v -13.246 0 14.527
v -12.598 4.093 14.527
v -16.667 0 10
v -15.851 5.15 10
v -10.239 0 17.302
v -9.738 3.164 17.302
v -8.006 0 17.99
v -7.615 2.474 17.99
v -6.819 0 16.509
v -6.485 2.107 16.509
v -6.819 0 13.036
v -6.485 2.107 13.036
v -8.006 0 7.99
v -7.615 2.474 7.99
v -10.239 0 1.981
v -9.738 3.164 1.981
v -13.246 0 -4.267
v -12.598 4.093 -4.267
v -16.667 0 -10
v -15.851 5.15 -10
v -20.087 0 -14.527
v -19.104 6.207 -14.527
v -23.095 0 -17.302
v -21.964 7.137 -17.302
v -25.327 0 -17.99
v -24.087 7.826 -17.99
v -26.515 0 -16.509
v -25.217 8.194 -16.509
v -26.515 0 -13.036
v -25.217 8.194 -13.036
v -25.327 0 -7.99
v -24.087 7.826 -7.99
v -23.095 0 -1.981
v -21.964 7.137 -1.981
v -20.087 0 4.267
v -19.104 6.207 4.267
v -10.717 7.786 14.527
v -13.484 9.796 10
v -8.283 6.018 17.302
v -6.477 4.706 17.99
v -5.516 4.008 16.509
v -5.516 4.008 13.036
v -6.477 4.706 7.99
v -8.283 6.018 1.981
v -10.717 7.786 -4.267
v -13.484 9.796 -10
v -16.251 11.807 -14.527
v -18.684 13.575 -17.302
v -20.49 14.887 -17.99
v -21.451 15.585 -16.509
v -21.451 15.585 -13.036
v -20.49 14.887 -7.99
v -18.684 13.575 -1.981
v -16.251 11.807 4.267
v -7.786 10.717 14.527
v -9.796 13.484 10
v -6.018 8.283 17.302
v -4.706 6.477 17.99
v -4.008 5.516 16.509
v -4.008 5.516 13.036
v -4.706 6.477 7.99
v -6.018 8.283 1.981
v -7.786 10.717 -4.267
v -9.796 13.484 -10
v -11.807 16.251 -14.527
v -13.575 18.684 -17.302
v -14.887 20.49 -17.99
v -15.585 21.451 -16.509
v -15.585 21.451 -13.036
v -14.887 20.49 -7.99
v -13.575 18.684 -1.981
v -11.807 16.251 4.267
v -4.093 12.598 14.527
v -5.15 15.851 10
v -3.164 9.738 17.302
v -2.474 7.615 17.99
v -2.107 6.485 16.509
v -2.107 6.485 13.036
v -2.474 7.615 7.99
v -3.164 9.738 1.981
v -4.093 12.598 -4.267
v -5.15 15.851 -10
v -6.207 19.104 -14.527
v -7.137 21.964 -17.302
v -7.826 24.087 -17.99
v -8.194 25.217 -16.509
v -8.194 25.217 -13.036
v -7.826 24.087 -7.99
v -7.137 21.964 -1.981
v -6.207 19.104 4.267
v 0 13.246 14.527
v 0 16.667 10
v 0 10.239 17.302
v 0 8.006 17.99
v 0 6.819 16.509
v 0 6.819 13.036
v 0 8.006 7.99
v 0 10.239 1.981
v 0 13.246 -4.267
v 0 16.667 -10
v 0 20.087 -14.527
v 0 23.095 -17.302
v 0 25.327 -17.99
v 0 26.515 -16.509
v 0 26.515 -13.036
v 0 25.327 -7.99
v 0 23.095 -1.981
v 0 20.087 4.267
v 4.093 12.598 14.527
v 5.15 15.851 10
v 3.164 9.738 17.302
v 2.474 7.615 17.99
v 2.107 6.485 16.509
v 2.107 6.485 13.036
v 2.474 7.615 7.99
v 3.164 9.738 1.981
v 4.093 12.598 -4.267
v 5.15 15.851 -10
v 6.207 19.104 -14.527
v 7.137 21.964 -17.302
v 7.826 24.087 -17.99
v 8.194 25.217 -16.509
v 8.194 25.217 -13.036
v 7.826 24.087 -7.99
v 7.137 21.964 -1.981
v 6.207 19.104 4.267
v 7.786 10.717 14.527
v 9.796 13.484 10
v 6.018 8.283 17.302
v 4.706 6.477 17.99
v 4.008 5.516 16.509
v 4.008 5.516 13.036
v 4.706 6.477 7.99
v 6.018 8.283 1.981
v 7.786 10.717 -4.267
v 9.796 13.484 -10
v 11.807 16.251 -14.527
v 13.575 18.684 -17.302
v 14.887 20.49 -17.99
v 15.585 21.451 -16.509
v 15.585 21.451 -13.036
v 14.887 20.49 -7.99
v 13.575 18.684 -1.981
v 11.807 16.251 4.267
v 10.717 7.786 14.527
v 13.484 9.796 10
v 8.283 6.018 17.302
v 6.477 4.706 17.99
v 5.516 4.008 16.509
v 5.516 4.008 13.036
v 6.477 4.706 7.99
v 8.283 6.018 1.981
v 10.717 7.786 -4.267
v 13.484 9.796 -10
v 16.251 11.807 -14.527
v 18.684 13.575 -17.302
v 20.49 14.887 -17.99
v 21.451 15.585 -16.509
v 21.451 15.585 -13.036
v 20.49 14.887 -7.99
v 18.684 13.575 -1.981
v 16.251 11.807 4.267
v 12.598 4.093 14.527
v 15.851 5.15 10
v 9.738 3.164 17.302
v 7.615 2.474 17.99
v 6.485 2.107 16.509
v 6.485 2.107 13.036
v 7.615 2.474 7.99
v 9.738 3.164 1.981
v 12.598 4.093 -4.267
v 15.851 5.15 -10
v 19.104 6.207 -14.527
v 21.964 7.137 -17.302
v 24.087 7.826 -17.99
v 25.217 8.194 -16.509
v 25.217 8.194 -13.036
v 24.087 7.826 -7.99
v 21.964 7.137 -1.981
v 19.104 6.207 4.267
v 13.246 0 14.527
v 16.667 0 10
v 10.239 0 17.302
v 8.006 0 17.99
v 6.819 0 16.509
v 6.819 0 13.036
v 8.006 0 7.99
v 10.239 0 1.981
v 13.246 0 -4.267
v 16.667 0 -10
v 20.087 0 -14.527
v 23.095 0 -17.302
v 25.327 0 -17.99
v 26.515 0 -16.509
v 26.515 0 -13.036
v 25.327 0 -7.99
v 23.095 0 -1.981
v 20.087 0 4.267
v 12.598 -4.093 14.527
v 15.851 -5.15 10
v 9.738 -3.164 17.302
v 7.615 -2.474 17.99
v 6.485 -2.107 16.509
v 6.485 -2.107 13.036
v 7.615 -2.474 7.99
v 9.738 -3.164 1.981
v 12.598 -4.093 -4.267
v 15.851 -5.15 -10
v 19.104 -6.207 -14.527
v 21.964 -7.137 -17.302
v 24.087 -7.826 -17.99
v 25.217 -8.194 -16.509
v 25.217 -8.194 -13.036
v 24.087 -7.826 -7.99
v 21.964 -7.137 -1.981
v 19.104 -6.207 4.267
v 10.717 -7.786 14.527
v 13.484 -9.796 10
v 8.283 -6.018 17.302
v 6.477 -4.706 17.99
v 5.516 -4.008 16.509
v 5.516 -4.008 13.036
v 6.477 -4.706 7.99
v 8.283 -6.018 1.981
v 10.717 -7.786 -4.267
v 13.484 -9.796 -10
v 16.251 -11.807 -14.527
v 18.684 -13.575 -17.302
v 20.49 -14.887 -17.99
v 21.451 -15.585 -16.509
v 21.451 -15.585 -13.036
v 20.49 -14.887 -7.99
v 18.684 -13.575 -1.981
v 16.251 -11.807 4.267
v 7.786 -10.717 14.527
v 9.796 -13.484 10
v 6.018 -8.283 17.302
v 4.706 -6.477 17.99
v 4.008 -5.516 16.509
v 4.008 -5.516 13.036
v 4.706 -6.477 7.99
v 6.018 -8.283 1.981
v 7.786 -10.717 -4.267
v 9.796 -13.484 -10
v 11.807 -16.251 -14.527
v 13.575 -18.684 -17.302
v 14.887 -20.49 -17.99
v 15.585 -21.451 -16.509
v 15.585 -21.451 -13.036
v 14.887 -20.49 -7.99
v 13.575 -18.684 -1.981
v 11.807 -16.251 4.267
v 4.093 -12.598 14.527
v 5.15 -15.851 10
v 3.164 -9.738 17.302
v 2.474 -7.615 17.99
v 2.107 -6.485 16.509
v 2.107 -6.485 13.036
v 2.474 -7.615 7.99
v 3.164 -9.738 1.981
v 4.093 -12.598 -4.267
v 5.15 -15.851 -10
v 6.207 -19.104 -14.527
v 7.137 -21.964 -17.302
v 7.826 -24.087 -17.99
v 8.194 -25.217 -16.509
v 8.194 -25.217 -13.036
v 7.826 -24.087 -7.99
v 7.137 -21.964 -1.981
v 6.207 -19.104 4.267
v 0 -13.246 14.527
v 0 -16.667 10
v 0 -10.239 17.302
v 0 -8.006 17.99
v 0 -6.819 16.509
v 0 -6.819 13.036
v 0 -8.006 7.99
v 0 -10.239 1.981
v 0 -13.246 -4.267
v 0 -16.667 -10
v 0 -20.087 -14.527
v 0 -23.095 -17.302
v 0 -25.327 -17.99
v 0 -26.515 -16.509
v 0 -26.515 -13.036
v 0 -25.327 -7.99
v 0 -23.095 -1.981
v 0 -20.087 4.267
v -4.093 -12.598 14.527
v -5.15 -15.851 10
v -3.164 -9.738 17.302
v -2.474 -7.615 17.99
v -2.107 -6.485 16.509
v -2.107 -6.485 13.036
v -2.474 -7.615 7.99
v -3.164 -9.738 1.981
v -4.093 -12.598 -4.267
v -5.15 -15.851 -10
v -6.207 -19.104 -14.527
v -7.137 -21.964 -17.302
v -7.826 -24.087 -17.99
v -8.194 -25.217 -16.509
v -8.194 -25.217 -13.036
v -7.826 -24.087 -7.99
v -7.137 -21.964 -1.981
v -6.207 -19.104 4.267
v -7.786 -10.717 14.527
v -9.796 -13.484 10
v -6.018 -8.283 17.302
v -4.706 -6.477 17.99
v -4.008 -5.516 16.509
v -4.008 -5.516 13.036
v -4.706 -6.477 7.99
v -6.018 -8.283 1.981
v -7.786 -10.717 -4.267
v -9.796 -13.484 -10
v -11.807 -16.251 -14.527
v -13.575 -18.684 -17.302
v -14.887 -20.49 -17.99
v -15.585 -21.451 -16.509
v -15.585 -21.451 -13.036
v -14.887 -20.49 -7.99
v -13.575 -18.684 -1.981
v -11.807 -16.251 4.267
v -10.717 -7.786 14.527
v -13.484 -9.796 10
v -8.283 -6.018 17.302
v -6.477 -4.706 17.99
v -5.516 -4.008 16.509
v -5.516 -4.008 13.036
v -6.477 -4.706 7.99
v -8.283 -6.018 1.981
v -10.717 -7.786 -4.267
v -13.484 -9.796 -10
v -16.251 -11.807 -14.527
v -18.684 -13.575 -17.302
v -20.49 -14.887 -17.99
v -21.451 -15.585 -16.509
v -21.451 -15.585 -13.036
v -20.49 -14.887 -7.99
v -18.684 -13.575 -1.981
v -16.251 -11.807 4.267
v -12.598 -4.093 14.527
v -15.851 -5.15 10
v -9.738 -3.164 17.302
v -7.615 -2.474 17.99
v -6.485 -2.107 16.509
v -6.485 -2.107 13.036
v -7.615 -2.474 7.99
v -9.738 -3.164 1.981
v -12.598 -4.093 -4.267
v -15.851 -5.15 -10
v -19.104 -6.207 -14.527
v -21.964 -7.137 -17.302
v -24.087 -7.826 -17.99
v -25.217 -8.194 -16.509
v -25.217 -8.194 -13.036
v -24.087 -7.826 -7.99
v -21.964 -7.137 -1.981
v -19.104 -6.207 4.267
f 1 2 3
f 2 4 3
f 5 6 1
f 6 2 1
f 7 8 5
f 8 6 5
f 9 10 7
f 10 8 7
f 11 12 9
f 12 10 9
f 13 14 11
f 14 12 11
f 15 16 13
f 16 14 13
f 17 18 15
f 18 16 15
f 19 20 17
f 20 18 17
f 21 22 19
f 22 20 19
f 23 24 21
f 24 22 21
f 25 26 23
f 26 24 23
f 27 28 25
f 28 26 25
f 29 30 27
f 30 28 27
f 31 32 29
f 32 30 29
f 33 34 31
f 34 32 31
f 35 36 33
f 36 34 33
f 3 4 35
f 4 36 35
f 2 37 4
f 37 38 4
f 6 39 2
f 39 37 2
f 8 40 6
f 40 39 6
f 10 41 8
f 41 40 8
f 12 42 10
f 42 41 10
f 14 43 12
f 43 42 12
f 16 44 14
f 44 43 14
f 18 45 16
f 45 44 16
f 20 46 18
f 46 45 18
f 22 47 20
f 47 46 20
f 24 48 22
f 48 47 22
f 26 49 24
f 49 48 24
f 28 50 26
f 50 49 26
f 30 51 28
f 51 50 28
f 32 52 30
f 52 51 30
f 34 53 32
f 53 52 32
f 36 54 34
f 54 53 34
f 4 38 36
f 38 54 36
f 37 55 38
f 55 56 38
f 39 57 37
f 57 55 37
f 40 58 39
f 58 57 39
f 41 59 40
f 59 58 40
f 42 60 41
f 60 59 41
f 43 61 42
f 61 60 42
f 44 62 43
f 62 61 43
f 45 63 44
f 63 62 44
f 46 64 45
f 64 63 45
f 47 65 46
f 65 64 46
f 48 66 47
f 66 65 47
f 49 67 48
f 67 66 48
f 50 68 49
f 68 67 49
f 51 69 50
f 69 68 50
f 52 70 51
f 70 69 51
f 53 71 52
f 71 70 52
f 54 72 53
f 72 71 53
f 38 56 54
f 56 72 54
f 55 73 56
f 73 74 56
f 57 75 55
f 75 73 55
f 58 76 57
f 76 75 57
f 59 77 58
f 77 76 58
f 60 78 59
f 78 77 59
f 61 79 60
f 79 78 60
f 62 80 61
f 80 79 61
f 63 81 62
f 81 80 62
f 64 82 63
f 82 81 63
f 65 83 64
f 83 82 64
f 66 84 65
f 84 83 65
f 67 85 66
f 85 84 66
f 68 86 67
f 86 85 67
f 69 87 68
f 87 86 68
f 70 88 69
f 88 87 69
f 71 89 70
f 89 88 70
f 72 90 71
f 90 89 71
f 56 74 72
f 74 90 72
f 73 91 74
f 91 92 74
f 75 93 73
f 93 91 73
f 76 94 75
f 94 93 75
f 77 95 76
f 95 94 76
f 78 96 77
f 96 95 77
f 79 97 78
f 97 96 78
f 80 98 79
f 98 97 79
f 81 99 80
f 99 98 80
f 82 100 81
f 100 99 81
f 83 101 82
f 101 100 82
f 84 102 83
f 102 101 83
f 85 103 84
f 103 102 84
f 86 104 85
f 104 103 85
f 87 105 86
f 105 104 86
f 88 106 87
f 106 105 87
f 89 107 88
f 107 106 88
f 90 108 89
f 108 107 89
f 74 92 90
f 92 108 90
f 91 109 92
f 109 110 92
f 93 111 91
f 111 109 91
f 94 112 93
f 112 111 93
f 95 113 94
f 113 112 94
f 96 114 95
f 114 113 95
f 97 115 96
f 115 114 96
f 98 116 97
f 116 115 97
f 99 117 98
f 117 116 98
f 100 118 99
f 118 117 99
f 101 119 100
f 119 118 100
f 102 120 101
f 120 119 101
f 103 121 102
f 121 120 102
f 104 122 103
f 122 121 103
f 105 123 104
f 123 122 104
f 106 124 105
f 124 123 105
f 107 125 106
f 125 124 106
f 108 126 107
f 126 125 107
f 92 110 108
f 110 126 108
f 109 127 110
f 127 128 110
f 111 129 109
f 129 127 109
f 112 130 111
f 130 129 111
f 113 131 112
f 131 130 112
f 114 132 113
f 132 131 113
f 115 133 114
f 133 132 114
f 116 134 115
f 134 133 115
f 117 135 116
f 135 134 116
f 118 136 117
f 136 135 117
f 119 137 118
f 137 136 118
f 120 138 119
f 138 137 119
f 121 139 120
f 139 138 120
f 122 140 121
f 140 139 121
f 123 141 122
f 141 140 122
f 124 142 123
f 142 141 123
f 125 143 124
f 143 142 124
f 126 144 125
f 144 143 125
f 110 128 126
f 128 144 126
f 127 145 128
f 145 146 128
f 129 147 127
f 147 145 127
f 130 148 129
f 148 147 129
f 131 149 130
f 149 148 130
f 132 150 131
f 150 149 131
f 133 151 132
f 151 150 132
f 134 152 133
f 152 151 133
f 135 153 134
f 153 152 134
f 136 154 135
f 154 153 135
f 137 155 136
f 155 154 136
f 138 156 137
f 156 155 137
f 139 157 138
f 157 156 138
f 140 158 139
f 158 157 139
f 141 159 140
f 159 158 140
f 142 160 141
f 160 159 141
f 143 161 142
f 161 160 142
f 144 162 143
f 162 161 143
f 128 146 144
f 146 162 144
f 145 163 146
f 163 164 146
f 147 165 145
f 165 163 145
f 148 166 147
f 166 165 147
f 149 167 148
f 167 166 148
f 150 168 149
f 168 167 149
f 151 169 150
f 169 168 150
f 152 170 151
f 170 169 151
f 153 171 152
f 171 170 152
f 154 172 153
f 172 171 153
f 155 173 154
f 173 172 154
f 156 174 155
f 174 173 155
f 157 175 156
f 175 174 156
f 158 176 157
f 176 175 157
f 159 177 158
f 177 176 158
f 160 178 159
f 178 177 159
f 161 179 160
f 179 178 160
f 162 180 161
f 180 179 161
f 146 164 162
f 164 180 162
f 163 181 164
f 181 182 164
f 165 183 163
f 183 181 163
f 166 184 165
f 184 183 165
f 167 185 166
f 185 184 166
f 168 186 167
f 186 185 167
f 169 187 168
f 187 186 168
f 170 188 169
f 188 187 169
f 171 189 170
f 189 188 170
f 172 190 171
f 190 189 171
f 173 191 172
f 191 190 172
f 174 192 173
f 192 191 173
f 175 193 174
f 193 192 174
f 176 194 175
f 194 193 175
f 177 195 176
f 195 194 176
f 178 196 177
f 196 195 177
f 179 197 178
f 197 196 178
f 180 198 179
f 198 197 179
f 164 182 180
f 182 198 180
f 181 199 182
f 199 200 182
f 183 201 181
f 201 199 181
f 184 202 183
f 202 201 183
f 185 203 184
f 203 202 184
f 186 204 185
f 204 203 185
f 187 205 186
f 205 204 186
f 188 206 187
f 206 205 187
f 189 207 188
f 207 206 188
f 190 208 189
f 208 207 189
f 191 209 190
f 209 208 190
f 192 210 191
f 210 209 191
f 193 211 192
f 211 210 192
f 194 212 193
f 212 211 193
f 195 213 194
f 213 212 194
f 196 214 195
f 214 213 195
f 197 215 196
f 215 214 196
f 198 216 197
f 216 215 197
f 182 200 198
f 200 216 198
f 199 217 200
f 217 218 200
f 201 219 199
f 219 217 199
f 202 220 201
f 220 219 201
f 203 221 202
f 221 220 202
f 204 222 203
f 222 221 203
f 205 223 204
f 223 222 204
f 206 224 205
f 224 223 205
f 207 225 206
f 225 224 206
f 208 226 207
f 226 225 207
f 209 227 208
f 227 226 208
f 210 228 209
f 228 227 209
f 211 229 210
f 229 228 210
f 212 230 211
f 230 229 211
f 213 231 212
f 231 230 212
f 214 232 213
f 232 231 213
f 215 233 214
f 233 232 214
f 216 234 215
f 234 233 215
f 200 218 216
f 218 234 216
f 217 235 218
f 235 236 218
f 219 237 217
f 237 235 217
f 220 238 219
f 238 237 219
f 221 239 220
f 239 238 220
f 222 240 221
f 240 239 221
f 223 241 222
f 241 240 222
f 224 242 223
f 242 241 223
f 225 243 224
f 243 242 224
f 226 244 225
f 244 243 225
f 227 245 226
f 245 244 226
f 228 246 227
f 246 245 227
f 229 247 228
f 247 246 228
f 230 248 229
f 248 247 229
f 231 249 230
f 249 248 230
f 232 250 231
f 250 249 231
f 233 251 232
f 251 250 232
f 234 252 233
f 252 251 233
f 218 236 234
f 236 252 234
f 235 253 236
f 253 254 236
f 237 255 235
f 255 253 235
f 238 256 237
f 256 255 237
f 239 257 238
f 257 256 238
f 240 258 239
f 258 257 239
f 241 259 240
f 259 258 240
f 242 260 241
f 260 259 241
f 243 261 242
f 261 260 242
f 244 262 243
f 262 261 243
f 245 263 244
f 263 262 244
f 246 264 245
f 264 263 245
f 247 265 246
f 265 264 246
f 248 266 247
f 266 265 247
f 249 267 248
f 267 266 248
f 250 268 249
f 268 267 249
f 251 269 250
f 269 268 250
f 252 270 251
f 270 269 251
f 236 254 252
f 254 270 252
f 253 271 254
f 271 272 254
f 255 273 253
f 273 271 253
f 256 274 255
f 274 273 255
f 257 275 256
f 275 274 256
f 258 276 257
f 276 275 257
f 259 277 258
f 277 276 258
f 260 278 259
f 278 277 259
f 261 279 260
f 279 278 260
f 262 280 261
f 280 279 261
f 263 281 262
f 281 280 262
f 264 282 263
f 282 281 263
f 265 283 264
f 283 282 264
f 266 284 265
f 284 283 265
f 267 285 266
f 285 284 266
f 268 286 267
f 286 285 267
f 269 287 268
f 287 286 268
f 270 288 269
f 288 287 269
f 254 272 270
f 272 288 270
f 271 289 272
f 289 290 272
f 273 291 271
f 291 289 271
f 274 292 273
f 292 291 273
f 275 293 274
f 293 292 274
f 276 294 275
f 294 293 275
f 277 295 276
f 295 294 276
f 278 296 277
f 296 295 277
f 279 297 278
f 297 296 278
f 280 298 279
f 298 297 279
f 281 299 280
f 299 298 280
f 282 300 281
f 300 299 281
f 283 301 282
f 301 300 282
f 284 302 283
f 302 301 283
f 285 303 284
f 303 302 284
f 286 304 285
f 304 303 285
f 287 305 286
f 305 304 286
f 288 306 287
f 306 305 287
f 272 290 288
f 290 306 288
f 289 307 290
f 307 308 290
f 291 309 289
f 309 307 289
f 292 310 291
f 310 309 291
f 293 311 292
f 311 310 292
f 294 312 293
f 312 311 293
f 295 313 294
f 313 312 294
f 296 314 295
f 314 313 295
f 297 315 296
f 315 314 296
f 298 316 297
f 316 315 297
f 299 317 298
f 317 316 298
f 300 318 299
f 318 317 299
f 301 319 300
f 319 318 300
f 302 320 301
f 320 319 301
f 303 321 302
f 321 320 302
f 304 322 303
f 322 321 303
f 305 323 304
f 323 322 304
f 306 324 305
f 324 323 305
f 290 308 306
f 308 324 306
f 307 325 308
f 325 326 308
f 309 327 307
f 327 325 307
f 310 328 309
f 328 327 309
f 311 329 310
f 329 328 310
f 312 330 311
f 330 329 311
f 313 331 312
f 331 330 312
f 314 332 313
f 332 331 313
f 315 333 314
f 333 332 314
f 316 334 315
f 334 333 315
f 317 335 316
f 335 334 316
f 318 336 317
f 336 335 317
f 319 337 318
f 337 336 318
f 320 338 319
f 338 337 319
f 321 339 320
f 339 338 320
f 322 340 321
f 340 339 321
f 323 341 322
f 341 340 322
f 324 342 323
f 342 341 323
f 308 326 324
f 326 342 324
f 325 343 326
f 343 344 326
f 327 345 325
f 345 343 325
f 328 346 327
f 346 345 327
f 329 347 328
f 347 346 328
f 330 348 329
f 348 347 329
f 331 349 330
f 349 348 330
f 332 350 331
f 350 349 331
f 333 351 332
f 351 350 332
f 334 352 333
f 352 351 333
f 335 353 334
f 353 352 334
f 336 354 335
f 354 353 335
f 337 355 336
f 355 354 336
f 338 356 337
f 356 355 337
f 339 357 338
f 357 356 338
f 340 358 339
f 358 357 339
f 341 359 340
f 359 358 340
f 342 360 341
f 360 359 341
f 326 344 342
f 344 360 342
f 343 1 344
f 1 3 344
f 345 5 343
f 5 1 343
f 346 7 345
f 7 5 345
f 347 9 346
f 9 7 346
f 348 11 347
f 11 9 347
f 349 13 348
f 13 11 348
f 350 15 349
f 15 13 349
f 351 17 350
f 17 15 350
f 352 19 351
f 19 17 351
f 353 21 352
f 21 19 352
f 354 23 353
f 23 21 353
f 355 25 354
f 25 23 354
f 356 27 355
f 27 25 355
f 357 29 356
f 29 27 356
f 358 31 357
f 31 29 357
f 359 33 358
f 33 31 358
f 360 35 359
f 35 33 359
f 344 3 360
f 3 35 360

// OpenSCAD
outerdiameter=50;
height=100;

//
rotate_extrude($fn=20,convexity=10)
translate([outerdiameter/3,0,0])
scale([4,4,10])
rotate([60,60,90])
circle($fn=18,r=5);
